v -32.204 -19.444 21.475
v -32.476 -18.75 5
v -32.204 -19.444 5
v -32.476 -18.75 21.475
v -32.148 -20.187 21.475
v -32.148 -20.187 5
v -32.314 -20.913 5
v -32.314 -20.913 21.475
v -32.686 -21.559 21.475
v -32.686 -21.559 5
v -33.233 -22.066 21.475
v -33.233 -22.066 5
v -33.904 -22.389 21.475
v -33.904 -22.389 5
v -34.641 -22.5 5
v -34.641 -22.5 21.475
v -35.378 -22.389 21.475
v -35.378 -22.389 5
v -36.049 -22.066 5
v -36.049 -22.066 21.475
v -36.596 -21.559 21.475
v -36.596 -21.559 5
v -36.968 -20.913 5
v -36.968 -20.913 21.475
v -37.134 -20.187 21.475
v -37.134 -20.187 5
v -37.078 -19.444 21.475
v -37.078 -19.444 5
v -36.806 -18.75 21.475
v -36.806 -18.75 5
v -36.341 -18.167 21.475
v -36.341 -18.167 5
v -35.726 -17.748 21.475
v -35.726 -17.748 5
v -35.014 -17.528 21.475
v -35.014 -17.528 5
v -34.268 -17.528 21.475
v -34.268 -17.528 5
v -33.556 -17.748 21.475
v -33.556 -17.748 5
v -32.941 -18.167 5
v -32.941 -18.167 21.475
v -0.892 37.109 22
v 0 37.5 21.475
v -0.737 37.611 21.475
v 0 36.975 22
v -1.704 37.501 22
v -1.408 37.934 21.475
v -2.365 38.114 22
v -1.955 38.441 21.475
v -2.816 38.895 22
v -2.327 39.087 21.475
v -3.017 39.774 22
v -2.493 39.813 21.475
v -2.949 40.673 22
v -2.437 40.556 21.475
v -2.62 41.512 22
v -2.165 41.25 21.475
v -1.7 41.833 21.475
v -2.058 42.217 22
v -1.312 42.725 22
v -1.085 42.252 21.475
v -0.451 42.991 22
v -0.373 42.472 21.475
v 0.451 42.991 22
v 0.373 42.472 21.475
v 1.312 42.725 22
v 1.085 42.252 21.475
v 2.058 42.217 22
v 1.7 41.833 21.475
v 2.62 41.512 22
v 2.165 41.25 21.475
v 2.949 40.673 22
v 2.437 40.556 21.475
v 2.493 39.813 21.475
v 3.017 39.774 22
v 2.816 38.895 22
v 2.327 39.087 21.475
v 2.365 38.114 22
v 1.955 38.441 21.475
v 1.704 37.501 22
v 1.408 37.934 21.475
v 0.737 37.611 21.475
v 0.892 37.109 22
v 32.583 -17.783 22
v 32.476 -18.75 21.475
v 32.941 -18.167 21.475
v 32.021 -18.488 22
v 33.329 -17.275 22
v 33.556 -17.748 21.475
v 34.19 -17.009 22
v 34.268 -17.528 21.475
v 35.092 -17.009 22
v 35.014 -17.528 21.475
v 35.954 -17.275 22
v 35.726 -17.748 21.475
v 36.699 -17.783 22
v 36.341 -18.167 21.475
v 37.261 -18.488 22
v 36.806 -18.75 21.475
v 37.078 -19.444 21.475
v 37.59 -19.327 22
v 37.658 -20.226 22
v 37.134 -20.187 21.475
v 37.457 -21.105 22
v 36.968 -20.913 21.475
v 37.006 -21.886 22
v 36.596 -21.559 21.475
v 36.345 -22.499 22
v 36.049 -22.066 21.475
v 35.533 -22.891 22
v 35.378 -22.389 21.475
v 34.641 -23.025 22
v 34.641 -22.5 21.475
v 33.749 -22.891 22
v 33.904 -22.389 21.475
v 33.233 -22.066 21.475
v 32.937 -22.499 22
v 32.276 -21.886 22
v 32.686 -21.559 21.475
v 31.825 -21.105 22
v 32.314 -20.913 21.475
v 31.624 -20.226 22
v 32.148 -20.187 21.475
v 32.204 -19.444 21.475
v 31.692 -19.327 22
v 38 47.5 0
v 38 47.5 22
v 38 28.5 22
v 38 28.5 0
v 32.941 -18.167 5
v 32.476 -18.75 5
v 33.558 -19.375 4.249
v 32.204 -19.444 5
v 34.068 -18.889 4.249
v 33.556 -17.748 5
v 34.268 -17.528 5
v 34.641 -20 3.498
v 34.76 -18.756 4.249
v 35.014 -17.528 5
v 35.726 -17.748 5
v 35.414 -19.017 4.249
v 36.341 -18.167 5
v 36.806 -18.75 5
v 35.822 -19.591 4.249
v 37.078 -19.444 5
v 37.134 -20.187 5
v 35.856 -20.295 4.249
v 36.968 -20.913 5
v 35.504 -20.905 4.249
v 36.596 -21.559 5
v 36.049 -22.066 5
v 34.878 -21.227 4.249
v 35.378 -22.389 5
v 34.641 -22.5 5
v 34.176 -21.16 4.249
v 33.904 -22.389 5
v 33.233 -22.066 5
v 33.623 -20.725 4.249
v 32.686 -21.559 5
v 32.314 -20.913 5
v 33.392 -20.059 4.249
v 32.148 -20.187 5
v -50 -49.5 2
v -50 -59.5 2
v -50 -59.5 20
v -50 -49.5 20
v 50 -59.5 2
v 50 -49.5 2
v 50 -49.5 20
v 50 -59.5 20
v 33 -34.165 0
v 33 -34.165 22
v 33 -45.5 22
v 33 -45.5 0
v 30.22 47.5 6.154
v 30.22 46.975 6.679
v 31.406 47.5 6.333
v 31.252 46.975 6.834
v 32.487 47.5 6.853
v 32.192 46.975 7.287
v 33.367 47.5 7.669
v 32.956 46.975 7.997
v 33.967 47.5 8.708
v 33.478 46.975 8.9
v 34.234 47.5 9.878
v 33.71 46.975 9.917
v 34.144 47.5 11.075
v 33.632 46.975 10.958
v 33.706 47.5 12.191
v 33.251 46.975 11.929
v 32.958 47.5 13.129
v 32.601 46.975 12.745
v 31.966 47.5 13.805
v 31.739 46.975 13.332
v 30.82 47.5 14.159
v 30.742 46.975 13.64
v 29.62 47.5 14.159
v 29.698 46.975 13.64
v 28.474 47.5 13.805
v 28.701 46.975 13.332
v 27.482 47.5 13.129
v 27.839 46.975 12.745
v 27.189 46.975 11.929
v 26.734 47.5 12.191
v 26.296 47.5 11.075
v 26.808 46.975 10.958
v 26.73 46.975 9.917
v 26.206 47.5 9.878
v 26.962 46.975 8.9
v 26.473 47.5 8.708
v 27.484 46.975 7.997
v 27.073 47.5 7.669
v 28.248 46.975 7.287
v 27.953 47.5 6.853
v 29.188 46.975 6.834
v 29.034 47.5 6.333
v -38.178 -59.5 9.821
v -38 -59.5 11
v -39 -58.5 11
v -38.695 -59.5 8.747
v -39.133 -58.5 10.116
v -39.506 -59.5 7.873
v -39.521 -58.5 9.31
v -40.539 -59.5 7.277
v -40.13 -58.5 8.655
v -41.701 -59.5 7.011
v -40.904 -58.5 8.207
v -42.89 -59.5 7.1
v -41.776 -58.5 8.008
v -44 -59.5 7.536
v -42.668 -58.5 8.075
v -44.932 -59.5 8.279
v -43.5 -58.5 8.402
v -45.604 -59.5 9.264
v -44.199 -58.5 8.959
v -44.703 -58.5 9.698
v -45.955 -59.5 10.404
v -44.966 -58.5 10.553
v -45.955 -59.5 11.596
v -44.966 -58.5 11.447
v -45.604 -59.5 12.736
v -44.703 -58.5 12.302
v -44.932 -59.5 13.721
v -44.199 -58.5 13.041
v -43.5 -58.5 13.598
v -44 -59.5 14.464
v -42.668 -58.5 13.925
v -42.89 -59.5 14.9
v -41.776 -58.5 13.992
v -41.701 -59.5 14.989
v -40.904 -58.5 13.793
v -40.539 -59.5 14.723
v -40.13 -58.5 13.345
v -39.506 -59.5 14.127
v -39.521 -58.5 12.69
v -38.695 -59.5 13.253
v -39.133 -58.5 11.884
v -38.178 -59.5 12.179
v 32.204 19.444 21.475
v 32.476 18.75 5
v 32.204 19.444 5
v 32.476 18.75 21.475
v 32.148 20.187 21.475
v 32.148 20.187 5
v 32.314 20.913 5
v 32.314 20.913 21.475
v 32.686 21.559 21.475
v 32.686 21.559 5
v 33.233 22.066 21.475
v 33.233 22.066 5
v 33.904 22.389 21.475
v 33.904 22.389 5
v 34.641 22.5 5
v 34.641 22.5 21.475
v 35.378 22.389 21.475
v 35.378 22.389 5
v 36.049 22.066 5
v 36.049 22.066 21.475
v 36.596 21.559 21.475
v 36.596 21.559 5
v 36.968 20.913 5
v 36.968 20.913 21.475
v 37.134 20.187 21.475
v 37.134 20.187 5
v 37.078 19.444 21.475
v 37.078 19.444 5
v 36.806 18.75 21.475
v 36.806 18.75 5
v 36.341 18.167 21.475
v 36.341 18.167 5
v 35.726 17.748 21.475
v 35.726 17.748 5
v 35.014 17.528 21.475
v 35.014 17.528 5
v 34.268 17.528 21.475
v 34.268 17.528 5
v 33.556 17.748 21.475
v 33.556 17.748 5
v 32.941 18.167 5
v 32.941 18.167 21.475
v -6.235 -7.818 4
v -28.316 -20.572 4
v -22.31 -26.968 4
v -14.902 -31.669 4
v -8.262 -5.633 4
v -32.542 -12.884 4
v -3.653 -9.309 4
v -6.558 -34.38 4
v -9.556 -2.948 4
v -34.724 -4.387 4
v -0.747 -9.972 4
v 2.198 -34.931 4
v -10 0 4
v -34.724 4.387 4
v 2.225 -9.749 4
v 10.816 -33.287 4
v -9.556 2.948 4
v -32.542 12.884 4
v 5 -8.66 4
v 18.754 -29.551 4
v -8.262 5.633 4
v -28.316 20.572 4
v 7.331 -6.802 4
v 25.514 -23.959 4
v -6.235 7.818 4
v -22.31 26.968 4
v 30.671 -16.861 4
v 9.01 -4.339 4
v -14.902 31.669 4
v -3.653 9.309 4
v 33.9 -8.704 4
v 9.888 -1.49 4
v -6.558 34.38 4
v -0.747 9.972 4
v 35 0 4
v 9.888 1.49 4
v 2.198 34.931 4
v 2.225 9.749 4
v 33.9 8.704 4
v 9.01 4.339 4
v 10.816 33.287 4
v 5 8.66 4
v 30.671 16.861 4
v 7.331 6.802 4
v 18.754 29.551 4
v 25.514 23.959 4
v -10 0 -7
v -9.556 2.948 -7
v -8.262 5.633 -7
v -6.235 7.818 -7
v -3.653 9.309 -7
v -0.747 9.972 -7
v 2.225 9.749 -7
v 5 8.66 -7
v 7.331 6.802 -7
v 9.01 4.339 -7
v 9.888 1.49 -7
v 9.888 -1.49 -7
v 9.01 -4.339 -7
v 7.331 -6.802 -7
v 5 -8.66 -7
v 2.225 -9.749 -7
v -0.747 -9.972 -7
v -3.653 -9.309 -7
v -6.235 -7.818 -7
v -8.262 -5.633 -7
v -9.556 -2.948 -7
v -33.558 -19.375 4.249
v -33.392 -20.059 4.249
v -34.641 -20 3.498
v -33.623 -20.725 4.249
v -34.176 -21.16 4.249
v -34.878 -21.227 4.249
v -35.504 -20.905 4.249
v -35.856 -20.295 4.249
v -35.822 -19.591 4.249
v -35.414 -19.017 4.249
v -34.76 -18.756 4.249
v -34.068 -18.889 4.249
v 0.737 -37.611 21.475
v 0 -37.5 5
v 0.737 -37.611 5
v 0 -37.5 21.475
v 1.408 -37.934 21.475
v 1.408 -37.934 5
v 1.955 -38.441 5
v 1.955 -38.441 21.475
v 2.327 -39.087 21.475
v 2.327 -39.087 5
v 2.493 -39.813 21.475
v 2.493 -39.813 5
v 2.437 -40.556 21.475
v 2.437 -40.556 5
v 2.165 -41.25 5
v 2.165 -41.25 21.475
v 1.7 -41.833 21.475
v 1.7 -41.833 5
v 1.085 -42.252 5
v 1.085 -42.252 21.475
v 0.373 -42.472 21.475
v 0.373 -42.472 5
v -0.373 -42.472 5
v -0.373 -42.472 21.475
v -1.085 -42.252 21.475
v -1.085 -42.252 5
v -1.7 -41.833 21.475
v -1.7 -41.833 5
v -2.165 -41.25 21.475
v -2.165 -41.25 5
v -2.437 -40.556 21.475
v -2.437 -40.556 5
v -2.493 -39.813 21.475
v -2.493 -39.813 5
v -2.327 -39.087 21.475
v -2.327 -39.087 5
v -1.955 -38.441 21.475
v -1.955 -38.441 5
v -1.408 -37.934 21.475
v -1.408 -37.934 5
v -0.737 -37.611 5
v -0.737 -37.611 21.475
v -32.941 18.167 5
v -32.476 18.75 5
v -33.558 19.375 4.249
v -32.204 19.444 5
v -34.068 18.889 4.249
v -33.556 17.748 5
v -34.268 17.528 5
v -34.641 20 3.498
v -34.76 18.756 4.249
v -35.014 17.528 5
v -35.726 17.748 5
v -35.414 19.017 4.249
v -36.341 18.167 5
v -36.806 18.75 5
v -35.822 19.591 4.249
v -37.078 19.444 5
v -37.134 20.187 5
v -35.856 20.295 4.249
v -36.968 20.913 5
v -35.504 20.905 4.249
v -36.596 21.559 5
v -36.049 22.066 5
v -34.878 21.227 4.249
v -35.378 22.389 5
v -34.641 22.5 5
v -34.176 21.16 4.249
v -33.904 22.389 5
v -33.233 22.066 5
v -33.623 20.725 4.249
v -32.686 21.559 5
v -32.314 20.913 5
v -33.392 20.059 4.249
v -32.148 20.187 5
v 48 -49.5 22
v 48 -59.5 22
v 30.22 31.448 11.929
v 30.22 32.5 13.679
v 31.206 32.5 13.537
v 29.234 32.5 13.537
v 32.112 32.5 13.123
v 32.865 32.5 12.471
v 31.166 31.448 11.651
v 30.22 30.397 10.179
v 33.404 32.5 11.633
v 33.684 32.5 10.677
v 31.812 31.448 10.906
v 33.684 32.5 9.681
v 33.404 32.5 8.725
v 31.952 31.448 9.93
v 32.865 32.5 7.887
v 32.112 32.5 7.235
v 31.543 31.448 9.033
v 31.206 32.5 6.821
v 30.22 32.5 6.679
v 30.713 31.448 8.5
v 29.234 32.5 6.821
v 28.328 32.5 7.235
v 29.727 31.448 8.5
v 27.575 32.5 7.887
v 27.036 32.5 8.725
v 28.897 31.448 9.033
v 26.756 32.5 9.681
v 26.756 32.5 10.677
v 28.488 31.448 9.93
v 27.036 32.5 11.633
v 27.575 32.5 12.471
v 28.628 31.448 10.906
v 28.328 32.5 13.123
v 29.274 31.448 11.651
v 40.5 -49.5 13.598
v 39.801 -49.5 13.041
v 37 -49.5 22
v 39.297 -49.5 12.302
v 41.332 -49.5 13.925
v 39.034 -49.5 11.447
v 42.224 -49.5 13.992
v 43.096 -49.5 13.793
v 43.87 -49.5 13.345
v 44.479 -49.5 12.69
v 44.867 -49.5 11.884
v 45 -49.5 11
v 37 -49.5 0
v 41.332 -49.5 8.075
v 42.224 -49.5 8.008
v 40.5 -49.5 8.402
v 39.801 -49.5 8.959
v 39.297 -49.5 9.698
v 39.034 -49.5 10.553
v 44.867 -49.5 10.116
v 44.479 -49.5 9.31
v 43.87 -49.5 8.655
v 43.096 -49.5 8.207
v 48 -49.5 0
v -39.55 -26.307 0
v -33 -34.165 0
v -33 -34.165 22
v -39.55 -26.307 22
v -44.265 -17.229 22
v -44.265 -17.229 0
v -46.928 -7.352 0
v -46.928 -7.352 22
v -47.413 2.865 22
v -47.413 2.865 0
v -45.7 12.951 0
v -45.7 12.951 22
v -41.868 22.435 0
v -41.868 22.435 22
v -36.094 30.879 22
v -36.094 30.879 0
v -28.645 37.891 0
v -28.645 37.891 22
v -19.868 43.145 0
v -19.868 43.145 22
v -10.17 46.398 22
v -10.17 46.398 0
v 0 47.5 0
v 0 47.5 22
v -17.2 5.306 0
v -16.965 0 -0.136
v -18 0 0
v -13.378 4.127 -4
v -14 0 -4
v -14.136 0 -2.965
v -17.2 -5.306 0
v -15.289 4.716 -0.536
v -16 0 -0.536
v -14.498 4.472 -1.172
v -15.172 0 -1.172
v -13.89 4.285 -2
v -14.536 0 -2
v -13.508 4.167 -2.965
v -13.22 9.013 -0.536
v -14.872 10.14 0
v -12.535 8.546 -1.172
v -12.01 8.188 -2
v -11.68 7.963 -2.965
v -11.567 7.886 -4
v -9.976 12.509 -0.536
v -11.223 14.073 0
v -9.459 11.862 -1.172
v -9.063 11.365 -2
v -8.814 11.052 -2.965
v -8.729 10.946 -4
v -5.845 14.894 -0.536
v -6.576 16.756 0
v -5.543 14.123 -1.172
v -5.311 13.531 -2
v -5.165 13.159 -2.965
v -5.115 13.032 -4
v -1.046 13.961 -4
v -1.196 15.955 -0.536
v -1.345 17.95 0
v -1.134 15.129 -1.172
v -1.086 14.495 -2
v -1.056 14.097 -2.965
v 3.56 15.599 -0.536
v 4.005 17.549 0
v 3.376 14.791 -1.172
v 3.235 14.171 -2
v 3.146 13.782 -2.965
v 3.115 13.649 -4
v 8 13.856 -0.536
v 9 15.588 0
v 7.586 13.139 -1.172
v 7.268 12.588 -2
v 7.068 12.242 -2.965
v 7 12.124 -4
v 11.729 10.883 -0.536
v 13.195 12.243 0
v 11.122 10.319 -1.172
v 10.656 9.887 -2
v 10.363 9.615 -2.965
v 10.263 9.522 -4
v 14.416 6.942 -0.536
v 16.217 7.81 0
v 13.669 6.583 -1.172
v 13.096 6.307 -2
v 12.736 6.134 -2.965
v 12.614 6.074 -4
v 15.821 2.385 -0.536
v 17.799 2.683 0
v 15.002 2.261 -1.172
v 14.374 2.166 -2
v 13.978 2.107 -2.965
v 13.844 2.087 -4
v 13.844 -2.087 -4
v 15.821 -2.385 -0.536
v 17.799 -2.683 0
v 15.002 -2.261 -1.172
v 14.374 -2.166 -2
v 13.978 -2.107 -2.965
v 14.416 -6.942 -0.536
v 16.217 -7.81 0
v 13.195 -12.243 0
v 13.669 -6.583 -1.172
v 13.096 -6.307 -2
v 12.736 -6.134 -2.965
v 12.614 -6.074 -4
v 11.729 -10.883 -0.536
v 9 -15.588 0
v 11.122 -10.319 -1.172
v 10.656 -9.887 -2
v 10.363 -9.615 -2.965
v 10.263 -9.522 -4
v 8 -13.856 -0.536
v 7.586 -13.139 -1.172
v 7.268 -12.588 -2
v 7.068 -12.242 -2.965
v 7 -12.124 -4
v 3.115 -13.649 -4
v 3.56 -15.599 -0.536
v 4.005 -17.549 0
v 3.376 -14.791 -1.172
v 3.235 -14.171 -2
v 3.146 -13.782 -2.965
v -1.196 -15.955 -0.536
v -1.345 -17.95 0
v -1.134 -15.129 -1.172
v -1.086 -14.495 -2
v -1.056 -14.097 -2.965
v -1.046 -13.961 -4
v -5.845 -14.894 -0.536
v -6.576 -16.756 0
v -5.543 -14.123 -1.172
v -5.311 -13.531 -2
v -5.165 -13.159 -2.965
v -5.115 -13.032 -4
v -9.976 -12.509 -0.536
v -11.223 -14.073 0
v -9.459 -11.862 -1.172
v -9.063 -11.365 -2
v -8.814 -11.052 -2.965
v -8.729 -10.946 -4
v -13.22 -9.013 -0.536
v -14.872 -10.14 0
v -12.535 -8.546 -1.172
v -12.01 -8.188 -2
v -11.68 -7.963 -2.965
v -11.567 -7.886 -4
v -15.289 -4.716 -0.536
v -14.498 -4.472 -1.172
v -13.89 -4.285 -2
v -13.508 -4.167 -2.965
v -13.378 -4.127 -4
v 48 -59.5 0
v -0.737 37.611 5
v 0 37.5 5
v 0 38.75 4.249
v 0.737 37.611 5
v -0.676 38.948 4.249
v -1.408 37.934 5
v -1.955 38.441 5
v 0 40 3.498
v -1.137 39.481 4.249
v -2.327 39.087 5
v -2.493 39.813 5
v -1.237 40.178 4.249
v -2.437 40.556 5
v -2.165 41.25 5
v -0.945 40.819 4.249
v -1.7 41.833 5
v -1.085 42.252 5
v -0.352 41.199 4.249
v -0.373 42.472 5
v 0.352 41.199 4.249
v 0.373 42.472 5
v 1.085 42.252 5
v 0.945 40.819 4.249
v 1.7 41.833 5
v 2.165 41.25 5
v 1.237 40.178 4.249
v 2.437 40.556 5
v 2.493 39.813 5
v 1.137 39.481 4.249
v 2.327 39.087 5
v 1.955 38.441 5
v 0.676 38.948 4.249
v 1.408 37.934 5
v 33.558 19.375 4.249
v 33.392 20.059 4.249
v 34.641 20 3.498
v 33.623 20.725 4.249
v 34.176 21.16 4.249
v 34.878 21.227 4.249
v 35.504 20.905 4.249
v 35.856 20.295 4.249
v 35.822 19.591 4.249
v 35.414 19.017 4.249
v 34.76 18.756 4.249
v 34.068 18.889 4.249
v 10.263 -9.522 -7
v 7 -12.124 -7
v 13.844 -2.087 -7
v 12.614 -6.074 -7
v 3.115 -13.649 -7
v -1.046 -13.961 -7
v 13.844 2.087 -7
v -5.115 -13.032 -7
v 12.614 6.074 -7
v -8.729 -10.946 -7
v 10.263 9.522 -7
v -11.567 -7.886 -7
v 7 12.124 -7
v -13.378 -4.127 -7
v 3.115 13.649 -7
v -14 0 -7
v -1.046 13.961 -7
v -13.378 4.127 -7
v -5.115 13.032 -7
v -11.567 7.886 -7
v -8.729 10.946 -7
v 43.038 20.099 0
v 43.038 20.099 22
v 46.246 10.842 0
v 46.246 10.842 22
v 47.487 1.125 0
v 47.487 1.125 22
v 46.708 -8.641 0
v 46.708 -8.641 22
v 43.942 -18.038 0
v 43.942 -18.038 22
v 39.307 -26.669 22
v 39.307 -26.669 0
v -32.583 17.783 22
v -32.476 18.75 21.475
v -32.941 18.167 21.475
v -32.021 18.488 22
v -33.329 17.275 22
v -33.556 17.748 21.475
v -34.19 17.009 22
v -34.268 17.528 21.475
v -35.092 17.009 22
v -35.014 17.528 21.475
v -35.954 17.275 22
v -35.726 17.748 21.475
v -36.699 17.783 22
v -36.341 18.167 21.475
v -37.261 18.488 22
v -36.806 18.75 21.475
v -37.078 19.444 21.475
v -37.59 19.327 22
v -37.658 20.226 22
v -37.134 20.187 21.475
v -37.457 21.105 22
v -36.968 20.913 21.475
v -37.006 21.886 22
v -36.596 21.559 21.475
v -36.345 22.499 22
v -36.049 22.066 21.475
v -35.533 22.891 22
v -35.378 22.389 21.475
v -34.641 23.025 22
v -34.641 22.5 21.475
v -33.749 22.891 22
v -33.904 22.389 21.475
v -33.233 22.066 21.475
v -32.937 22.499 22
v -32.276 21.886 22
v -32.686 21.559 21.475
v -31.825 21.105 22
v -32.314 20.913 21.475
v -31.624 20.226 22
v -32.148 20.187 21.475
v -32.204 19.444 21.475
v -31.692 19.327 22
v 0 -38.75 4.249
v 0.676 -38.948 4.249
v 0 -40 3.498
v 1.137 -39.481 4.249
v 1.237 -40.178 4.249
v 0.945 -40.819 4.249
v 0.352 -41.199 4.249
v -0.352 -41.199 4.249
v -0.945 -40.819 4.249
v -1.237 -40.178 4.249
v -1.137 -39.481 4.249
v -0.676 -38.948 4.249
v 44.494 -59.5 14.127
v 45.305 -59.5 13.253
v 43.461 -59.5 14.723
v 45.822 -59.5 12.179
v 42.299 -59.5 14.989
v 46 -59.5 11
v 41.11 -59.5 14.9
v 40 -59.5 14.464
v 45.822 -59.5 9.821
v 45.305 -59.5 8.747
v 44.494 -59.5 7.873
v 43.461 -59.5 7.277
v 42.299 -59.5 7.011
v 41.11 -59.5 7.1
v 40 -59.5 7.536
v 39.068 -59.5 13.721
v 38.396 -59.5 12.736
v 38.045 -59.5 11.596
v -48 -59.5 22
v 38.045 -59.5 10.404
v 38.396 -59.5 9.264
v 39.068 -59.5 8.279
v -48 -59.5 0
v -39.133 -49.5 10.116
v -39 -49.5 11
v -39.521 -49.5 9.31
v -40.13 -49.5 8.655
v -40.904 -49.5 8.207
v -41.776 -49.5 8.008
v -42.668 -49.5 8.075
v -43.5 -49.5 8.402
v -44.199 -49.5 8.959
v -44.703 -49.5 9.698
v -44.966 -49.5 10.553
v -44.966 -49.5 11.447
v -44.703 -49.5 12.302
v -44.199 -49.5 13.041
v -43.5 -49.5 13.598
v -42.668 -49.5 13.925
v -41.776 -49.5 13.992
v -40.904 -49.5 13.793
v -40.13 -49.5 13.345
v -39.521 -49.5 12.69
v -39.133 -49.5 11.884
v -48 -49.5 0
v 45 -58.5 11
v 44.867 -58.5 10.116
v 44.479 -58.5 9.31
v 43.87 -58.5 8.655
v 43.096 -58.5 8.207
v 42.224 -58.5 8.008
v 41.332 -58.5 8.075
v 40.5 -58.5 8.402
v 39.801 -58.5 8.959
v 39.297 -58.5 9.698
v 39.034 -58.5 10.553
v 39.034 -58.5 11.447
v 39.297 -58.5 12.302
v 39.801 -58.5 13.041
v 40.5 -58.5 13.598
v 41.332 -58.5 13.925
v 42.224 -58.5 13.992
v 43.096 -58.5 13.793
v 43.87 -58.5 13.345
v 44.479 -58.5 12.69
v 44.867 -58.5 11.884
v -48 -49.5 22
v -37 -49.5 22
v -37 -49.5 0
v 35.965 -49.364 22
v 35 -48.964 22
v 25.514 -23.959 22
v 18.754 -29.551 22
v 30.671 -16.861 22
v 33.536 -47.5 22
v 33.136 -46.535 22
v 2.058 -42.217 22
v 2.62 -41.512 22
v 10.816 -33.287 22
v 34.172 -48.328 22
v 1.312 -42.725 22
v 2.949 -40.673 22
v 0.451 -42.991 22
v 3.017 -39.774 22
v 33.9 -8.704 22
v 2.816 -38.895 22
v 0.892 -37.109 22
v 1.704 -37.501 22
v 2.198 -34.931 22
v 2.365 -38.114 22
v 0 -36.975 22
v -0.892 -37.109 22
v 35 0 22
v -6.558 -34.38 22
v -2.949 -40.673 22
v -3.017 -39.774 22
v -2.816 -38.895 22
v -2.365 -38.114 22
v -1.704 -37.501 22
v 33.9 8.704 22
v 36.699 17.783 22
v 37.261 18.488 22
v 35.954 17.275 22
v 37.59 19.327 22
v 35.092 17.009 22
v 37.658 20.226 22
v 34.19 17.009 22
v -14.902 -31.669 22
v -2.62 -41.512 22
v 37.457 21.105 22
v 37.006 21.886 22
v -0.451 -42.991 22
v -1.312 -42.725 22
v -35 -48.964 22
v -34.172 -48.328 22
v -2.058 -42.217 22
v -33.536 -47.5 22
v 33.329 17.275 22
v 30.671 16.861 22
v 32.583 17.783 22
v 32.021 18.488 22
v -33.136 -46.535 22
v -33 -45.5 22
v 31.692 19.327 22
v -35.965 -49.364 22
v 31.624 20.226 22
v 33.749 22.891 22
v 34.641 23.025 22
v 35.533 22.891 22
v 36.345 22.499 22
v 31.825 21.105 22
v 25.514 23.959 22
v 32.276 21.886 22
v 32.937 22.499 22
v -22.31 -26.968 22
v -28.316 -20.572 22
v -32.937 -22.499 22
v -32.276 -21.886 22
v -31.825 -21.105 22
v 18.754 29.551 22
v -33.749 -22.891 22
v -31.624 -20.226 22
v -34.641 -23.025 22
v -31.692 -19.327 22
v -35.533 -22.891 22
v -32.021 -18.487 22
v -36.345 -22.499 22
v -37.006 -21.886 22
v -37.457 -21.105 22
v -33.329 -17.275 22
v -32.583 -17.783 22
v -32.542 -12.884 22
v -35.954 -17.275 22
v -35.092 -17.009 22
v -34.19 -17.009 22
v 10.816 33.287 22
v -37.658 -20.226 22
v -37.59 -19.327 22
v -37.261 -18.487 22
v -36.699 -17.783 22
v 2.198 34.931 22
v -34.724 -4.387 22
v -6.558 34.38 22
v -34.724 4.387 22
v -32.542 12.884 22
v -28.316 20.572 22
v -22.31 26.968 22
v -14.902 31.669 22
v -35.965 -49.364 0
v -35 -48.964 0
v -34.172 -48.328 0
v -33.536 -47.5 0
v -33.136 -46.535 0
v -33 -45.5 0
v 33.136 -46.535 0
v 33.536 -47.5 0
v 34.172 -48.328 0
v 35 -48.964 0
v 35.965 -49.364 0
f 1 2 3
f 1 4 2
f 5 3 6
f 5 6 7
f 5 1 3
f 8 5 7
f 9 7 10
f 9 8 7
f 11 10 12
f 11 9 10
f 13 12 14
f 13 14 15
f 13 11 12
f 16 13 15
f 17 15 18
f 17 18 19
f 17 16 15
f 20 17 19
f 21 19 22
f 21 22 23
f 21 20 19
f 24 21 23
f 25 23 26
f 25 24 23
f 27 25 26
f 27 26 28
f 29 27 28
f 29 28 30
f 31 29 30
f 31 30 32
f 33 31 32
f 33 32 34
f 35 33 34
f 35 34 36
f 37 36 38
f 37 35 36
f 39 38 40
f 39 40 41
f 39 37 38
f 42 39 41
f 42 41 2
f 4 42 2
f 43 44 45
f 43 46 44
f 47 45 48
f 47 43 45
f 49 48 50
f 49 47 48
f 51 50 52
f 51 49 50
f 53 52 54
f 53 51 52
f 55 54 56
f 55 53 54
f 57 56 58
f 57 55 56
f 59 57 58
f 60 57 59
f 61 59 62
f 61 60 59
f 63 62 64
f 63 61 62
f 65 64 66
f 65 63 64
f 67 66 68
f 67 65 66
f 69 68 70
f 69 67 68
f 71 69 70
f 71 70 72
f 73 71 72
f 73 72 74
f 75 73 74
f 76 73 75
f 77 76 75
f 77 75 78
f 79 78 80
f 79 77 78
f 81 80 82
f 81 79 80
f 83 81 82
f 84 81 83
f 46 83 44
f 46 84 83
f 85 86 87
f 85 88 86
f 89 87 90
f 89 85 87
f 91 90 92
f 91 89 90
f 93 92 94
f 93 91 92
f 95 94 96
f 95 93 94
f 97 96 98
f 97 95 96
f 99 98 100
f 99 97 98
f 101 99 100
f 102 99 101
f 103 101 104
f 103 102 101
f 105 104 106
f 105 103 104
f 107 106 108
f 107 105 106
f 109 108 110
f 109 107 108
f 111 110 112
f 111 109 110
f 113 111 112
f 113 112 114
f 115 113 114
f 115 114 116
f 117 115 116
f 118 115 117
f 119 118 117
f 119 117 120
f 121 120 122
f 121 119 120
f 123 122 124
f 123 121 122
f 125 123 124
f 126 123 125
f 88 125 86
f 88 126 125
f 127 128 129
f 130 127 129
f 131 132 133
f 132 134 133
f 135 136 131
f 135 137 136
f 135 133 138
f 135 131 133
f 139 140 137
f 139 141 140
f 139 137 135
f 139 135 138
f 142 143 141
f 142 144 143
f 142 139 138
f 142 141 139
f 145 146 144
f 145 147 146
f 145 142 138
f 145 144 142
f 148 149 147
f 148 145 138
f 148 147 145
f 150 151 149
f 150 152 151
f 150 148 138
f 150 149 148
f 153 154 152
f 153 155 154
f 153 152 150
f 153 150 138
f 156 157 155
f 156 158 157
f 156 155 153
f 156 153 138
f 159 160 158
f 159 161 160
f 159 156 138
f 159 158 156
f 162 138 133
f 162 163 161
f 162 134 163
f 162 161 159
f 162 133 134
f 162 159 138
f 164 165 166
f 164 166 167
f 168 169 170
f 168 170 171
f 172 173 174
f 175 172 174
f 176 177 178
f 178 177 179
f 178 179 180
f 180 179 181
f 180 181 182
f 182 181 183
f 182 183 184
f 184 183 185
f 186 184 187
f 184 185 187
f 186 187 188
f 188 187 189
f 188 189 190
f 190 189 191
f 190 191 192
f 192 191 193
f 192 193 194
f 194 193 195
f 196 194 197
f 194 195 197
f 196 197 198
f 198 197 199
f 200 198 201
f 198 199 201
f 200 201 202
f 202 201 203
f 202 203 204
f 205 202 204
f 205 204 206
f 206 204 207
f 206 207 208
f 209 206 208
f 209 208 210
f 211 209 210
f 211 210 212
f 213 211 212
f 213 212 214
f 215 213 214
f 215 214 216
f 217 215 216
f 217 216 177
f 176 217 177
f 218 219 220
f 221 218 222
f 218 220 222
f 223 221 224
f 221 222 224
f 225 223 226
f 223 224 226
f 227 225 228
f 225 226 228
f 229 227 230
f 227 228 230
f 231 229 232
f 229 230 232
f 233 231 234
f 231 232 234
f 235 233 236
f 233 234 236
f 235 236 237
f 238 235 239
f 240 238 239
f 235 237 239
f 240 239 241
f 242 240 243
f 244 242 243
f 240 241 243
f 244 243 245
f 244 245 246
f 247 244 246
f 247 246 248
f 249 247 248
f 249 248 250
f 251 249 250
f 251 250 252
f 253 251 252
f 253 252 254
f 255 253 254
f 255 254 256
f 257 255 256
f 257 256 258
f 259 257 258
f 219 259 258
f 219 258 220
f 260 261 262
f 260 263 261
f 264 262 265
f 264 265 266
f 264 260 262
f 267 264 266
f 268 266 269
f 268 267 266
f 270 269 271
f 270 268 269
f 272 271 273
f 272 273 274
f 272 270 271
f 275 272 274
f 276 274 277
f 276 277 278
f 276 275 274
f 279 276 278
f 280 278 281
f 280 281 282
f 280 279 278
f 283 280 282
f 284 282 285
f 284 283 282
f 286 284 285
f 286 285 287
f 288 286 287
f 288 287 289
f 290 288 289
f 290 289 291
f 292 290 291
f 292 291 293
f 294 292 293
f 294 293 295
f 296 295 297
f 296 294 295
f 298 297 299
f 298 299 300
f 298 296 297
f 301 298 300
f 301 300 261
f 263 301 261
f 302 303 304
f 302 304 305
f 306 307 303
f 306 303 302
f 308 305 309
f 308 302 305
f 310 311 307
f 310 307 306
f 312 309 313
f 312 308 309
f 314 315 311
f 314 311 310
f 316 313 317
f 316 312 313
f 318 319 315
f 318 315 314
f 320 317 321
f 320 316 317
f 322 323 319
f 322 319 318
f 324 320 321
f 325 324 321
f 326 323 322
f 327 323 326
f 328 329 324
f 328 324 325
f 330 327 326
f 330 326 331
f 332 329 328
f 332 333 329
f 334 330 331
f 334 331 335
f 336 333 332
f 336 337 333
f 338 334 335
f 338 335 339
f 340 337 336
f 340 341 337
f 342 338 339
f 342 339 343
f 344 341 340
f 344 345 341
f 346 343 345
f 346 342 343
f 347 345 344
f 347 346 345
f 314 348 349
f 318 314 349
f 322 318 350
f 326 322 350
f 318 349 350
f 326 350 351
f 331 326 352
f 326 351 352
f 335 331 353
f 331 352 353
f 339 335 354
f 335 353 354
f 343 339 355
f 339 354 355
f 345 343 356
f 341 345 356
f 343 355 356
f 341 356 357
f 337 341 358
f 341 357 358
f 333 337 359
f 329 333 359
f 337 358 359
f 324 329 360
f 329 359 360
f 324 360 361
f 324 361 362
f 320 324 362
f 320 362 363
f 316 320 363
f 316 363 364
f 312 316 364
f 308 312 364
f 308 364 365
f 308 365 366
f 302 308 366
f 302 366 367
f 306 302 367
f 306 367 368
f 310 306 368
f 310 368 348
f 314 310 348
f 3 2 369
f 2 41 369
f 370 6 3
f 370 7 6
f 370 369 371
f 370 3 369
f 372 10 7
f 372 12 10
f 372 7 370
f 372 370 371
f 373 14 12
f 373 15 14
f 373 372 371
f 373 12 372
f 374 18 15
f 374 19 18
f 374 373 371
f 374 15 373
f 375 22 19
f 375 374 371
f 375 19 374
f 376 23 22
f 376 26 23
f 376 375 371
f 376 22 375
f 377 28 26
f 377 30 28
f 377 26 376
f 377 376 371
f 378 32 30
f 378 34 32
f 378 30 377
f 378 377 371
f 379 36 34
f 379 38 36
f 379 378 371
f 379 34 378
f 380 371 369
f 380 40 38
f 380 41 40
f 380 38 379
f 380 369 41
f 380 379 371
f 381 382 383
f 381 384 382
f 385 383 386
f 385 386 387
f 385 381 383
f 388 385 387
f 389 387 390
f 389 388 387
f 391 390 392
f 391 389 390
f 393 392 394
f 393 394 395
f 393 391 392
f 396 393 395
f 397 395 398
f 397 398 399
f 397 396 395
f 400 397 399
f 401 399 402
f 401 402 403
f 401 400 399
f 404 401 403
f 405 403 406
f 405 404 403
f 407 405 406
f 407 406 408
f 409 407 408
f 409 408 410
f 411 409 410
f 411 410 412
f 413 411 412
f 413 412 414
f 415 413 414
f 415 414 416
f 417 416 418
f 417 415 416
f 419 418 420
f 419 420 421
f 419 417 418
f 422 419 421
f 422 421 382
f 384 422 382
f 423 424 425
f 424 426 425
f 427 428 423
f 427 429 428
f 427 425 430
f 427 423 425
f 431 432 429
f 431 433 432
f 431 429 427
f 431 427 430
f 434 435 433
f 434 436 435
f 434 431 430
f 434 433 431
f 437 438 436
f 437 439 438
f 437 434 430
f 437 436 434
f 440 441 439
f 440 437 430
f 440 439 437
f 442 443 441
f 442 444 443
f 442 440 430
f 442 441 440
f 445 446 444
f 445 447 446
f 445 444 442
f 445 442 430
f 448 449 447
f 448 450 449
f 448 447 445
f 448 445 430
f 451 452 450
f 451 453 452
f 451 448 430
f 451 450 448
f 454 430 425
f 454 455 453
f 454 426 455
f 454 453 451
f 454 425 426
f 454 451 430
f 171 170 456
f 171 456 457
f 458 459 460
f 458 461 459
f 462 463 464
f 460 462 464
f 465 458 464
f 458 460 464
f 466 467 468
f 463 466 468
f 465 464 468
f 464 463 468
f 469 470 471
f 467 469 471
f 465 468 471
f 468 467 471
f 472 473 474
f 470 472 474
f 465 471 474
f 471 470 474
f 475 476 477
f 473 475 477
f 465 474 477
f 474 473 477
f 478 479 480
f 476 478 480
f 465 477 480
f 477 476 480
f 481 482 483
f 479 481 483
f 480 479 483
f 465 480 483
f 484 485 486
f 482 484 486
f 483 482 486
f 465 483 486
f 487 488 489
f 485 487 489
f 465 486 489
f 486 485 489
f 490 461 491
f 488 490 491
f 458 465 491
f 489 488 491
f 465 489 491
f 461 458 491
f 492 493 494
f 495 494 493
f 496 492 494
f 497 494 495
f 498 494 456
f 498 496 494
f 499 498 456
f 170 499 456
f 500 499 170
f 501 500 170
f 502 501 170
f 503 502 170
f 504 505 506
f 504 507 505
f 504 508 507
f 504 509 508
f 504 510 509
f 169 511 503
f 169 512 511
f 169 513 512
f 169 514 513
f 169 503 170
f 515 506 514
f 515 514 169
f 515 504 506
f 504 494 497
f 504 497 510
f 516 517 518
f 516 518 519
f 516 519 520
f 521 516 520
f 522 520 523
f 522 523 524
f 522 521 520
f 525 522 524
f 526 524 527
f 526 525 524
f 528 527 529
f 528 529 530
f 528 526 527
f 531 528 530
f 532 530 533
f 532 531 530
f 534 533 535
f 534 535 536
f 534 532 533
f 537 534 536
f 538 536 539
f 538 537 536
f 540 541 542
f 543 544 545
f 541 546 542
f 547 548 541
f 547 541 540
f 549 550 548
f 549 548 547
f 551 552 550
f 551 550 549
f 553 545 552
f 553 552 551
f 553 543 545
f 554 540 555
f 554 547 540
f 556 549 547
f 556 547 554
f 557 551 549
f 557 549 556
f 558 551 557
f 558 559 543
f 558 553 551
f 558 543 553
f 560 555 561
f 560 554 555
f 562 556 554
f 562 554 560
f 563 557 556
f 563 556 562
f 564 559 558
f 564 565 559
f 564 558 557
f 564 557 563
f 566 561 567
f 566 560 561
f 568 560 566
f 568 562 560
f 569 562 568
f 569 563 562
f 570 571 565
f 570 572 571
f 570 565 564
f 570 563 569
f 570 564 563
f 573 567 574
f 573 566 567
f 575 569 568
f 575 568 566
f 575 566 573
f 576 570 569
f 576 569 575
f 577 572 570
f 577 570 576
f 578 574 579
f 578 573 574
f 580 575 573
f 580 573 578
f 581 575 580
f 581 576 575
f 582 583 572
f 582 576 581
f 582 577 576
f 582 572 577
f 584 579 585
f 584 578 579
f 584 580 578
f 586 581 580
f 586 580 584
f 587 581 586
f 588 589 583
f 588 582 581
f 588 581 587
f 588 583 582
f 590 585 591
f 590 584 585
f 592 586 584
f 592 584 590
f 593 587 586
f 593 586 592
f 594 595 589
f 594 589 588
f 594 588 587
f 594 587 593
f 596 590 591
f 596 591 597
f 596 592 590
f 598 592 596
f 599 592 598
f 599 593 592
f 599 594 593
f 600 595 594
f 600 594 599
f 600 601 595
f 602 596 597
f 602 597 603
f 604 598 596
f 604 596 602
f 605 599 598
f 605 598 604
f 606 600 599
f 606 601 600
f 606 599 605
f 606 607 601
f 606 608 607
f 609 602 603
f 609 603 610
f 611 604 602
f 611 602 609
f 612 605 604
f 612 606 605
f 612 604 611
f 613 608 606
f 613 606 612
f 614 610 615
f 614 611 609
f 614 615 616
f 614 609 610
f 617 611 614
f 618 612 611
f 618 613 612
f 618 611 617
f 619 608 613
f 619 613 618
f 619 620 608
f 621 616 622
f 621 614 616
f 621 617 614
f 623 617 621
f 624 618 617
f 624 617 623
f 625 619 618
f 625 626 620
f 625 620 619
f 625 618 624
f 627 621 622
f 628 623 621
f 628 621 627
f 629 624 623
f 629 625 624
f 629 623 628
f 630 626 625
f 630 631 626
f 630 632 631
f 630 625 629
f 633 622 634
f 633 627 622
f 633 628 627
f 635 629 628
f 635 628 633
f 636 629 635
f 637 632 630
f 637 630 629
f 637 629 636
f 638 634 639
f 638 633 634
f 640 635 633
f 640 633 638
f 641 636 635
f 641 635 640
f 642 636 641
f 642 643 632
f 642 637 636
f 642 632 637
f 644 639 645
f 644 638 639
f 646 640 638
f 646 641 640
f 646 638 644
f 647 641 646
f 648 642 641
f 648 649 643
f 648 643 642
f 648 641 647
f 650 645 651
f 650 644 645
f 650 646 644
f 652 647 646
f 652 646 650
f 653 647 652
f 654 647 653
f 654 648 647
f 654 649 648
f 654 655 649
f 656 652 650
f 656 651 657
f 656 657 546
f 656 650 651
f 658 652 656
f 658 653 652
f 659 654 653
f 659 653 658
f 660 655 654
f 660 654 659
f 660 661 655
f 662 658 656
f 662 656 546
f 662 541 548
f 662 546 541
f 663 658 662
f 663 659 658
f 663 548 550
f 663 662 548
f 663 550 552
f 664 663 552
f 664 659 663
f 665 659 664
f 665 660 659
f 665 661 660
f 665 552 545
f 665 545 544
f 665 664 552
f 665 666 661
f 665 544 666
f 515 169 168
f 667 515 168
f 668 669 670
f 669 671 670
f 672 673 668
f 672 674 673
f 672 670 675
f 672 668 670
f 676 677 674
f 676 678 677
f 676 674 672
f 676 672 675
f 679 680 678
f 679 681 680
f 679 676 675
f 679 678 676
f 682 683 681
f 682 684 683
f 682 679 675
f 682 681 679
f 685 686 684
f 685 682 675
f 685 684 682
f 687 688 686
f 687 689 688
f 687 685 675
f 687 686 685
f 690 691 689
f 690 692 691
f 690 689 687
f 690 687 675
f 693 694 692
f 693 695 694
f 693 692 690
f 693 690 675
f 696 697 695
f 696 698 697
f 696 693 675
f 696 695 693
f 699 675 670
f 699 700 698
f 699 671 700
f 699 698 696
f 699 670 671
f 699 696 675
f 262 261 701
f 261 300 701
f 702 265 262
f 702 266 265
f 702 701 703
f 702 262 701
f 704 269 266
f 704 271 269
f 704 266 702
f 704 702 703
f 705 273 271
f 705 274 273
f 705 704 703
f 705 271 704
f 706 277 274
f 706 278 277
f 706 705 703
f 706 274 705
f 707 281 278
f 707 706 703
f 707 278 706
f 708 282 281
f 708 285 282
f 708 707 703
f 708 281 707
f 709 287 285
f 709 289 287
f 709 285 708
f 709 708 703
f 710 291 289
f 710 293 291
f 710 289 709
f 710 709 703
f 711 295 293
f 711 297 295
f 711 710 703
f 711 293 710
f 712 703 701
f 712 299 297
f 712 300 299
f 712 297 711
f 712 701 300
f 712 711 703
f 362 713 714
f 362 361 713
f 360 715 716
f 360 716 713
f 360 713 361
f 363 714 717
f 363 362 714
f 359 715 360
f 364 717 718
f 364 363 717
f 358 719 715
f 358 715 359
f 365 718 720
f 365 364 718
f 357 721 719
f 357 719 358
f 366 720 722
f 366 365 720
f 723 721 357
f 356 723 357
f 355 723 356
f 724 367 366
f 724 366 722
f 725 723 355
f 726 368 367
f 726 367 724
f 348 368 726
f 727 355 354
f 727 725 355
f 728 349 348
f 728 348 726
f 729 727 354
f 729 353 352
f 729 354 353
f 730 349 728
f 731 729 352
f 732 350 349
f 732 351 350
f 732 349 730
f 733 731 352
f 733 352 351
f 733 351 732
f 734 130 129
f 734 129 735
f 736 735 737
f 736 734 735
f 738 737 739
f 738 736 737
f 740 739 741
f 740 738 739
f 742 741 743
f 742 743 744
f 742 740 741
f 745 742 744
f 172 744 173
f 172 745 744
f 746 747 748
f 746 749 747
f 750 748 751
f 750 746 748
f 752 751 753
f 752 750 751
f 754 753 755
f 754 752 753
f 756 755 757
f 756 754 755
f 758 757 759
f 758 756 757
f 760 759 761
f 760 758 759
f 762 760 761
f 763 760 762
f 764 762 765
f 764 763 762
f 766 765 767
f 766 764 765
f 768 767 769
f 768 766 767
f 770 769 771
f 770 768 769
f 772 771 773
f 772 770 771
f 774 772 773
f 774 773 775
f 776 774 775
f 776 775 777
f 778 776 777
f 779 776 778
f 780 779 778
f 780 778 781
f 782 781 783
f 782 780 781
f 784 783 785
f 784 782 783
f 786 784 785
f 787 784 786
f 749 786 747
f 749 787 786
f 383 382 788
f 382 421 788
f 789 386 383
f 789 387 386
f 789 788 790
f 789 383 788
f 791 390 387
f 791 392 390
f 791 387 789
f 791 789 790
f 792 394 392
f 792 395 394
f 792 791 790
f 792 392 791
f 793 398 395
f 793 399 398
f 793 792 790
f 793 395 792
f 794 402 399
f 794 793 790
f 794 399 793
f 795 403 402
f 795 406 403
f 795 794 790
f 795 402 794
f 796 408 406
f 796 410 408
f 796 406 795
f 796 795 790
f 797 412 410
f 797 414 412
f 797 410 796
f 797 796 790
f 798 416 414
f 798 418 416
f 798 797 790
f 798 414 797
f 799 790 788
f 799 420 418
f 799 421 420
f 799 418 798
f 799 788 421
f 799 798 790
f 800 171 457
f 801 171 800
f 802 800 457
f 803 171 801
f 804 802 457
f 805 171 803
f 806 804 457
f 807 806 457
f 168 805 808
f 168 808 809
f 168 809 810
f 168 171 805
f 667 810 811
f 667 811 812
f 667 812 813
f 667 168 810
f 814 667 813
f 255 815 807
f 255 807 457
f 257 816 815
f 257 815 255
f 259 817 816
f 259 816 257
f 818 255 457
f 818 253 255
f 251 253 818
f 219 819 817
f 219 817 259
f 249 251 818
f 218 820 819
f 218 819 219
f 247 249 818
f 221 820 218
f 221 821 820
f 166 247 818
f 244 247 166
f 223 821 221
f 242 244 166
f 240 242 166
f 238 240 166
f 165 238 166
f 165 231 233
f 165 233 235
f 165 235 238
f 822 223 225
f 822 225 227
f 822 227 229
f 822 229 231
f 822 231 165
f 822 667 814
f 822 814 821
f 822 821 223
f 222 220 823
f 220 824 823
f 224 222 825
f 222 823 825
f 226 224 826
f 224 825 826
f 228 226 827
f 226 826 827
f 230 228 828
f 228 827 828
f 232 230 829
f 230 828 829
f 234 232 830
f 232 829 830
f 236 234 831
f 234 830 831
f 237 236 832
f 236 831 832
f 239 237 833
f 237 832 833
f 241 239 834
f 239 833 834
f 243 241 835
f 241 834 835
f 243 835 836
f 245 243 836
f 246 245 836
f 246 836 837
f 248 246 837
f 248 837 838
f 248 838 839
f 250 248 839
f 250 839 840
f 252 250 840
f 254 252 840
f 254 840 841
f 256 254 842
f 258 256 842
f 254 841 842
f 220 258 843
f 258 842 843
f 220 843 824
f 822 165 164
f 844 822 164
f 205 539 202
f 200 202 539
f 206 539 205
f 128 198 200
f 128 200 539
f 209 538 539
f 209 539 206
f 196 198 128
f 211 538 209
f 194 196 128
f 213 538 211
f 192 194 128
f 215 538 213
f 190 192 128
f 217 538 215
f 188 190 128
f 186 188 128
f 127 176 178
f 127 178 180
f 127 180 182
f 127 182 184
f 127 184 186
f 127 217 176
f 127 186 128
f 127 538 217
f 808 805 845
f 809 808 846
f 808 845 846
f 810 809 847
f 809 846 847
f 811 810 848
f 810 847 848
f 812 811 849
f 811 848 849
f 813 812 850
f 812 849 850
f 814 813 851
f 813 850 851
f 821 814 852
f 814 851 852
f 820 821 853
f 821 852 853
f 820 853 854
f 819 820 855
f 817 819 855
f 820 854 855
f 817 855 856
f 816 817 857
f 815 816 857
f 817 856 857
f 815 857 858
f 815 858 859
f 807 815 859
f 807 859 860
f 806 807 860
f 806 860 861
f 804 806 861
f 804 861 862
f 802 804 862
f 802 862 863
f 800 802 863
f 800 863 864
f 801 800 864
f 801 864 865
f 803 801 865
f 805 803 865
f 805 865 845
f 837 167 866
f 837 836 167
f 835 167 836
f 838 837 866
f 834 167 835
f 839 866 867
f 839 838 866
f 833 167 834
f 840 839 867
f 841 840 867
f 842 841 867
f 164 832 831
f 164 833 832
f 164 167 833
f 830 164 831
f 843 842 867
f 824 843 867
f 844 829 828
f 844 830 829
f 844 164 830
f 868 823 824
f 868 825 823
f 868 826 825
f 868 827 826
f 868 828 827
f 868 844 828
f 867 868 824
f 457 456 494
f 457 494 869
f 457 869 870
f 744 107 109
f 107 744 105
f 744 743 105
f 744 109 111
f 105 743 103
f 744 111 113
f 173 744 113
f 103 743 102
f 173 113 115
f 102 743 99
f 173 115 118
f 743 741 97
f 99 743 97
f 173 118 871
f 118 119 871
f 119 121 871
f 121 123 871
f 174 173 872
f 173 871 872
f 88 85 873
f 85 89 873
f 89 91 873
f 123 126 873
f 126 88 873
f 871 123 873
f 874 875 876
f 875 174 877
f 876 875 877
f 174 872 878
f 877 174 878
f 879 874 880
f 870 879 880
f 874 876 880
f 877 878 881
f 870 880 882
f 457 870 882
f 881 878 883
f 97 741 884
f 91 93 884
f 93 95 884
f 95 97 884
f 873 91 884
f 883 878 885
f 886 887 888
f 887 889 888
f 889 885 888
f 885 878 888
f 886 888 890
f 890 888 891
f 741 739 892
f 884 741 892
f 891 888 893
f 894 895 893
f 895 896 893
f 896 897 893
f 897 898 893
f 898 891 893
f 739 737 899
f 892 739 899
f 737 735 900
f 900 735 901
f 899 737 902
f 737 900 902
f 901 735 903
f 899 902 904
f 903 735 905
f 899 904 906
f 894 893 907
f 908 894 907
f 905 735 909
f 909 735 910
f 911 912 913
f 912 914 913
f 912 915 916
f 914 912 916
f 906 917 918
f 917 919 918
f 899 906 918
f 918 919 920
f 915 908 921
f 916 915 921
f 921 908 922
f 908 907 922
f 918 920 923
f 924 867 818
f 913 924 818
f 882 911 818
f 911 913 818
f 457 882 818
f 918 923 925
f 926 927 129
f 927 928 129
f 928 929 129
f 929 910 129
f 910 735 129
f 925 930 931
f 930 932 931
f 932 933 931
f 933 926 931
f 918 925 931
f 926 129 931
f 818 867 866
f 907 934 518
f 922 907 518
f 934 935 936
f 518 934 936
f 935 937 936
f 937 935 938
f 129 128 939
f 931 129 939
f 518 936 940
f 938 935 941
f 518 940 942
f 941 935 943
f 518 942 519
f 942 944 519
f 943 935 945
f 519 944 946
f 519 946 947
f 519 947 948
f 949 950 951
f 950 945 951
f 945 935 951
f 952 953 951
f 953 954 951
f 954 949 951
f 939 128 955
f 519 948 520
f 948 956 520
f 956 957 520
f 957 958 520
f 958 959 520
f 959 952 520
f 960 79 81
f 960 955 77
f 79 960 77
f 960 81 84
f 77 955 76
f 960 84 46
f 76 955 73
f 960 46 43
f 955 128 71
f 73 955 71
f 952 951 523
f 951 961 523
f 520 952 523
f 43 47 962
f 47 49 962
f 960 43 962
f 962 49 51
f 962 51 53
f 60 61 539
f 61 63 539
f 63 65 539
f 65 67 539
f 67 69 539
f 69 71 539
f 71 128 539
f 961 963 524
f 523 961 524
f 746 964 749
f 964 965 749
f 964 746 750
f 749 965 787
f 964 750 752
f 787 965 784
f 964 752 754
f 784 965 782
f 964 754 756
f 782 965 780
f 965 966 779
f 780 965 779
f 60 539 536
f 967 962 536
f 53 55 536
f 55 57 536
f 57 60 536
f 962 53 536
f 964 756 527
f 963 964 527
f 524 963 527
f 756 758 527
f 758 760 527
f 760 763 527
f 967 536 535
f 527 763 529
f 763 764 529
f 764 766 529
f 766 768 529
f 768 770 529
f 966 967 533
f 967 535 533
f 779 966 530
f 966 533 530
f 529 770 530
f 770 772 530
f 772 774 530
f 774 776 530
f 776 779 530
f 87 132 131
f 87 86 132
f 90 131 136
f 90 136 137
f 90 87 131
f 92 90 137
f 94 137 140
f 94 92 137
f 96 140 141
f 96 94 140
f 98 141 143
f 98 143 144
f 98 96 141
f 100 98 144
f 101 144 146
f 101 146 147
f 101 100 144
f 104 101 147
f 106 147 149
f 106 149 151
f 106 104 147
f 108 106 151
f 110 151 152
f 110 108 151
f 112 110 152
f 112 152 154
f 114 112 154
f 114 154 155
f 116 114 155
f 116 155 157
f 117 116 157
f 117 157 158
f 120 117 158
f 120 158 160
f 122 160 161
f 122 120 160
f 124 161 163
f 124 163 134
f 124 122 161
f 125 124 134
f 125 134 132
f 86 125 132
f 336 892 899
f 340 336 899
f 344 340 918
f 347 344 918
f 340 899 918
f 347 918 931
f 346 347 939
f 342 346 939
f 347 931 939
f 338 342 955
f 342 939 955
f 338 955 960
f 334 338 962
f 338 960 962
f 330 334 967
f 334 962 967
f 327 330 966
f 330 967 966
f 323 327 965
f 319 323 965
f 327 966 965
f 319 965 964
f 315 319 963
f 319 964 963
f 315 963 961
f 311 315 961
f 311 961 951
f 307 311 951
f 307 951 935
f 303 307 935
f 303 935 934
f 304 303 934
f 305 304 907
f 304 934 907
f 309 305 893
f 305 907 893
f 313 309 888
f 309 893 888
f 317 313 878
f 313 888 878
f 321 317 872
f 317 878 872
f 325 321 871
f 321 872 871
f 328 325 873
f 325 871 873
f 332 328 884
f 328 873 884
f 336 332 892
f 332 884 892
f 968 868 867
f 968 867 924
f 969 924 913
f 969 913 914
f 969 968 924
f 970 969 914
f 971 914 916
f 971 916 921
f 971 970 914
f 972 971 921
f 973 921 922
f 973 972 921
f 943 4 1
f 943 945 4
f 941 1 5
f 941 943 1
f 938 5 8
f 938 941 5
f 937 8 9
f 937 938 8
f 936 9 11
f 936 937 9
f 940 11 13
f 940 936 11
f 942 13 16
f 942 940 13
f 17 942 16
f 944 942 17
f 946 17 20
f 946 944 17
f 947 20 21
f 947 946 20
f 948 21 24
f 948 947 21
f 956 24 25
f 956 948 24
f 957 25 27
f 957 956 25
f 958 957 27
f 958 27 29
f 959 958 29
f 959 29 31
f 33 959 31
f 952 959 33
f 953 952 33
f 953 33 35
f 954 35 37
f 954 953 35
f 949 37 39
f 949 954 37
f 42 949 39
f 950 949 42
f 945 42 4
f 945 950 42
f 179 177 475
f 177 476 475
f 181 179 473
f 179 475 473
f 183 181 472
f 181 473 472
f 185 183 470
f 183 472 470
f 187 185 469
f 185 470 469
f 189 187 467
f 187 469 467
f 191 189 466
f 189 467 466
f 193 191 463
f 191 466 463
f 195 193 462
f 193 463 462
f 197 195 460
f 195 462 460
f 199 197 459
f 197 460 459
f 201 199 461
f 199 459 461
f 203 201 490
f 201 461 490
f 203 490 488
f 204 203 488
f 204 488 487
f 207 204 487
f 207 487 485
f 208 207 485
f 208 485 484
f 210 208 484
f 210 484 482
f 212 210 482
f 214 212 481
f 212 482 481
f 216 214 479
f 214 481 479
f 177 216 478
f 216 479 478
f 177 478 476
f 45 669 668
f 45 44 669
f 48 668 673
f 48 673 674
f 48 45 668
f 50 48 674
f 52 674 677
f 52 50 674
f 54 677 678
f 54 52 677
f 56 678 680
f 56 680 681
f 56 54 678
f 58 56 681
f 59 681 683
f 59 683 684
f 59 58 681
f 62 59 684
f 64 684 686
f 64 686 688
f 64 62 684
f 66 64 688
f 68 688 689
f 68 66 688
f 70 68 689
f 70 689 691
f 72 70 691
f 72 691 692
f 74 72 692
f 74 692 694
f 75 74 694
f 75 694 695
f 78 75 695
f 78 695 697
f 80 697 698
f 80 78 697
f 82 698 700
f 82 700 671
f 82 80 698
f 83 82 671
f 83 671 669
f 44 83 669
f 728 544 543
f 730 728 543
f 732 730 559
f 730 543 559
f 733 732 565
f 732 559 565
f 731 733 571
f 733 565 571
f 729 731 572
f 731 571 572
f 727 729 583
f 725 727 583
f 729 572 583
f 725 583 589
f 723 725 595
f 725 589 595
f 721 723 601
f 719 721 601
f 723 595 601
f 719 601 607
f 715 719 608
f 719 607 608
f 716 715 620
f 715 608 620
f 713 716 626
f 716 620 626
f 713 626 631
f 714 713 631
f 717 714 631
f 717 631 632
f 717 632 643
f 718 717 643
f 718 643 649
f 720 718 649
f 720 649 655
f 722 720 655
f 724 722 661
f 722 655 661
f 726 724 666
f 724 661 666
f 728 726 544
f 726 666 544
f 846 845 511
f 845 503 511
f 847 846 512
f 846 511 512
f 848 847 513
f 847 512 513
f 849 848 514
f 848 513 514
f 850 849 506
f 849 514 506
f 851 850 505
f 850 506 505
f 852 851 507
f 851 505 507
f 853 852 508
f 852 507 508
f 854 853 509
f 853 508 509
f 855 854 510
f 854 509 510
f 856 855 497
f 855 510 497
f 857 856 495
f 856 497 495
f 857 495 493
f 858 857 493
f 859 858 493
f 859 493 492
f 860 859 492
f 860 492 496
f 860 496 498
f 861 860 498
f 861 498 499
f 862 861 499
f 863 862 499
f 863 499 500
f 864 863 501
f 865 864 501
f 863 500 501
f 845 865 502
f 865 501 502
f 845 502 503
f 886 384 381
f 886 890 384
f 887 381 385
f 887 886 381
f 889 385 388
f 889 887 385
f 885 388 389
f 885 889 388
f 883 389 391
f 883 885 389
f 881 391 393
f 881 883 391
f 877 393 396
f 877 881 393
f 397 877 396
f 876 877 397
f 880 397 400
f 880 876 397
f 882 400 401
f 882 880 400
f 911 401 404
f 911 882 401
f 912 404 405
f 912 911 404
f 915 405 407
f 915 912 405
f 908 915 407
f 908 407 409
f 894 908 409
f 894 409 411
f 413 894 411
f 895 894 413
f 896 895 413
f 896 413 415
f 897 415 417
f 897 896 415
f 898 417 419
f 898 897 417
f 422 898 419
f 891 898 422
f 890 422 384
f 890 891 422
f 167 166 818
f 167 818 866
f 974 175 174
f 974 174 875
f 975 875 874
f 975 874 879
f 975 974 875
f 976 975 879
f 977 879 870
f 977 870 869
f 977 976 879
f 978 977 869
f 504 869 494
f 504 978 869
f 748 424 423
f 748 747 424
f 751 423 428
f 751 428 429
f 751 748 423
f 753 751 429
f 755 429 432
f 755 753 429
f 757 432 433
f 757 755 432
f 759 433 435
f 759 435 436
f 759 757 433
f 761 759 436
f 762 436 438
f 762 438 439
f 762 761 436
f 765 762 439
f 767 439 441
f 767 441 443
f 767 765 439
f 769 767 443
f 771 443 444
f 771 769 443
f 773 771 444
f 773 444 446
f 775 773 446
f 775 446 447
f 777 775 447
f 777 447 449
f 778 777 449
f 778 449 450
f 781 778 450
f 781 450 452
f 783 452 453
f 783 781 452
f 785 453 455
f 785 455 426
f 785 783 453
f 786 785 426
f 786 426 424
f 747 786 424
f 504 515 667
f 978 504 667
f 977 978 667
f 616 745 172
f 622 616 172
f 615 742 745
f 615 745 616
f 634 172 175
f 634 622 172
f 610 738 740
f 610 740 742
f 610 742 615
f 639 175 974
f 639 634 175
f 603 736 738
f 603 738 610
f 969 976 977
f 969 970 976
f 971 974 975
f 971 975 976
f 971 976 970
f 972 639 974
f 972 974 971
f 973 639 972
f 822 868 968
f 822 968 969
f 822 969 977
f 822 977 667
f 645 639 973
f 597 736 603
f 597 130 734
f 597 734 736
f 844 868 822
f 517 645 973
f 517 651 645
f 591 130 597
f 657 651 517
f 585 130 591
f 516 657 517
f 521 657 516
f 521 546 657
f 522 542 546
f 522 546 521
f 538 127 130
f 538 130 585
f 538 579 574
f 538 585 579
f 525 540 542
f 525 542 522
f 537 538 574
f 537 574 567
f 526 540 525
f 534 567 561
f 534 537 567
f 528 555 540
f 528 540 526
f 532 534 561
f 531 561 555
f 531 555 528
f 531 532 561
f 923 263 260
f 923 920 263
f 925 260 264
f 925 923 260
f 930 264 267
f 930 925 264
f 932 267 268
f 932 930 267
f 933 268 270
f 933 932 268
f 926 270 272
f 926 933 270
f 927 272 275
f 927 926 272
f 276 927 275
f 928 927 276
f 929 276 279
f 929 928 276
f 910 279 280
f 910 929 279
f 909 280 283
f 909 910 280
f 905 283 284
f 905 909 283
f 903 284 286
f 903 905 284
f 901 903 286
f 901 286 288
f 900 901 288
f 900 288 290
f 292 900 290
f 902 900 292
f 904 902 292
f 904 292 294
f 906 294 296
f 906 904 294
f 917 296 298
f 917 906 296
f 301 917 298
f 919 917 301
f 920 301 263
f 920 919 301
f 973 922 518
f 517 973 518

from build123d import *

# Parameters (mm, degrees)
BOSS_EXTRUDE2_DEPTH                                 = 22
SKETCH6_R                                           = 35
CUT_EXTRUDE2_DEPTH                                  = 18
CHAMFER2_SIZE                                       = 2
CIRPATTERN2_COUNT                                   = 6
M8X1_0_TAPPED_HOLE1_D                               = 7
M8X1_0_TAPPED_HOLE1_DEPTH                           = 15
M8X1_0_TAPPED_HOLE1_CSINK_D                         = 8.05
M8X1_0_TAPPED_HOLE1_CSINK_ANGLE                     = 90
M8X1_0_TAPPED_HOLE1_TIP                             = 2.103012167
CSK_FOR_M8_COUNTERSUNK_FLAT_HEAD_SCREW1_D           = 6
CSK_FOR_M8_COUNTERSUNK_FLAT_HEAD_SCREW1_DEPTH       = 20
CSK_FOR_M8_COUNTERSUNK_FLAT_HEAD_SCREW1_CSINK_D     = 8
CSK_FOR_M8_COUNTERSUNK_FLAT_HEAD_SCREW1_CSINK_ANGLE = 90
CSK_FOR_M8_COUNTERSUNK_FLAT_HEAD_SCREW1_TIP         = 1.802581857
SKETCH15_R                                          = 14
BOSS_EXTRUDE3_DEPTH                                 = 7
FILLET1_R                                           = 4
SKETCH16_R                                          = 10
CUT_EXTRUDE3_DEPTH                                  = 30


with BuildPart() as part:
    # Sketch1 → Boss-Extrude2 (new body)
    with BuildSketch(Plane.XY):
        with BuildLine():
            Line((0, 47.5), (38, 47.5))
            Line((38, 47.5), (38, 28.5))
            ThreePointArc((38, 28.5), (47.349517724, -3.777985082), (33, -34.165040612))
            Line((33, -34.165040612), (33, -45.5))
            ThreePointArc((33, -45.5), (34.171572875, -48.328427125), (37, -49.5))
            Line((37, -49.5), (50, -49.5))
            Line((50, -49.5), (50, -59.5))
            Line((50, -59.5), (-50, -59.5))
            Line((-50, -59.5), (-50, -49.5))
            Line((-50, -49.5), (-37, -49.5))
            ThreePointArc((-37, -49.5), (-34.171572875, -48.328427125), (-33, -45.5))
            Line((-33, -45.5), (-33, -34.165040612))
            ThreePointArc((-33, -34.165040612), (-44.040262426, 17.796215482), (0, 47.5))
        make_face()
    extrude(amount=BOSS_EXTRUDE2_DEPTH)

    # Sketch6 → Cut-Extrude2 (cut)
    with BuildSketch(Plane.XY.offset(22)):
        Circle(SKETCH6_R)
    extrude(amount=-CUT_EXTRUDE2_DEPTH, mode=Mode.SUBTRACT)

    # Chamfer2
    chamfer2_edges = [part.edges().sort_by_distance(p)[0] for p in [
        (50, -54.5, 0),
        (-50, -54.5, 0),
        (-50, -54.5, 22),
        (50, -54.5, 22),
    ]]
    chamfer(chamfer2_edges, length=CHAMFER2_SIZE)

    # Sketch8 → M6 Tapped Hole2 (revolve, cut)
    with BuildSketch(Plane(origin=(0, 40, 22), x_dir=(0, -1, 0), z_dir=(1, 0, 0))):
        Polygon((0, 0), (0, 18.502151548), (2.5, 17), (2.5, 0.525), (3.025, 0), align=None)
    m6_tapped_hole2 = revolve(axis=Axis((0, 40, 28.35), (0, 0, -1)), mode=Mode.SUBTRACT)

    # CirPattern2: M6 Tapped Hole2 ×6 about axis
    cirpattern2_axis = Axis((0, 0, 0), (0, 0, 1))
    for i in range(1, CIRPATTERN2_COUNT):
        add(m6_tapped_hole2.rotate(cirpattern2_axis, i * 360 / CIRPATTERN2_COUNT), mode=Mode.SUBTRACT)

    # M8x1.0 Tapped Hole1
    with Locations(Plane(origin=(30.22, 47.5, 10.178935138), x_dir=(0, 0, 1), z_dir=(0, 1, 0))):
        with Locations((0, 0)):
            CounterSinkHole(M8X1_0_TAPPED_HOLE1_D / 2, M8X1_0_TAPPED_HOLE1_CSINK_D / 2, depth=M8X1_0_TAPPED_HOLE1_DEPTH, counter_sink_angle=M8X1_0_TAPPED_HOLE1_CSINK_ANGLE)
            with Locations((0, 0, -(M8X1_0_TAPPED_HOLE1_DEPTH + M8X1_0_TAPPED_HOLE1_TIP / 2))):  # 118° drill point
                Cone(0, M8X1_0_TAPPED_HOLE1_D / 2, M8X1_0_TAPPED_HOLE1_TIP, mode=Mode.SUBTRACT)

    # CSK for M8 Countersunk Flat Head Screw1
    with Locations(Plane(origin=(-42, -59.5, 11), x_dir=(-1, 0, 0), z_dir=(0, -1, 0))):
        with Locations((0, 0), (-84, 0)):
            CounterSinkHole(CSK_FOR_M8_COUNTERSUNK_FLAT_HEAD_SCREW1_D / 2, CSK_FOR_M8_COUNTERSUNK_FLAT_HEAD_SCREW1_CSINK_D / 2, depth=CSK_FOR_M8_COUNTERSUNK_FLAT_HEAD_SCREW1_DEPTH, counter_sink_angle=CSK_FOR_M8_COUNTERSUNK_FLAT_HEAD_SCREW1_CSINK_ANGLE)
            with Locations((0, 0, -(CSK_FOR_M8_COUNTERSUNK_FLAT_HEAD_SCREW1_DEPTH + CSK_FOR_M8_COUNTERSUNK_FLAT_HEAD_SCREW1_TIP / 2))):  # 118° drill point
                Cone(0, CSK_FOR_M8_COUNTERSUNK_FLAT_HEAD_SCREW1_D / 2, CSK_FOR_M8_COUNTERSUNK_FLAT_HEAD_SCREW1_TIP, mode=Mode.SUBTRACT)

    # Sketch15 → Boss-Extrude3 (add)
    with BuildSketch(Plane(origin=(0, 0, 0), x_dir=(-1, 0, 0), z_dir=(0, 0, -1))):
        Circle(SKETCH15_R)
    extrude(amount=BOSS_EXTRUDE3_DEPTH)

    # Fillet1
    fillet1_edges = [part.edges().sort_by_distance(p)[0] for p in [
        (14, 0, 0),
    ]]
    fillet(fillet1_edges, radius=FILLET1_R)

    # Sketch16 → Cut-Extrude3 (cut, through all)
    with BuildSketch(Plane(origin=(0, 0, -7), x_dir=(-1, 0, 0), z_dir=(0, 0, -1))):
        Circle(SKETCH16_R)
    extrude(amount=-CUT_EXTRUDE3_DEPTH, mode=Mode.SUBTRACT)


solid = part.part
